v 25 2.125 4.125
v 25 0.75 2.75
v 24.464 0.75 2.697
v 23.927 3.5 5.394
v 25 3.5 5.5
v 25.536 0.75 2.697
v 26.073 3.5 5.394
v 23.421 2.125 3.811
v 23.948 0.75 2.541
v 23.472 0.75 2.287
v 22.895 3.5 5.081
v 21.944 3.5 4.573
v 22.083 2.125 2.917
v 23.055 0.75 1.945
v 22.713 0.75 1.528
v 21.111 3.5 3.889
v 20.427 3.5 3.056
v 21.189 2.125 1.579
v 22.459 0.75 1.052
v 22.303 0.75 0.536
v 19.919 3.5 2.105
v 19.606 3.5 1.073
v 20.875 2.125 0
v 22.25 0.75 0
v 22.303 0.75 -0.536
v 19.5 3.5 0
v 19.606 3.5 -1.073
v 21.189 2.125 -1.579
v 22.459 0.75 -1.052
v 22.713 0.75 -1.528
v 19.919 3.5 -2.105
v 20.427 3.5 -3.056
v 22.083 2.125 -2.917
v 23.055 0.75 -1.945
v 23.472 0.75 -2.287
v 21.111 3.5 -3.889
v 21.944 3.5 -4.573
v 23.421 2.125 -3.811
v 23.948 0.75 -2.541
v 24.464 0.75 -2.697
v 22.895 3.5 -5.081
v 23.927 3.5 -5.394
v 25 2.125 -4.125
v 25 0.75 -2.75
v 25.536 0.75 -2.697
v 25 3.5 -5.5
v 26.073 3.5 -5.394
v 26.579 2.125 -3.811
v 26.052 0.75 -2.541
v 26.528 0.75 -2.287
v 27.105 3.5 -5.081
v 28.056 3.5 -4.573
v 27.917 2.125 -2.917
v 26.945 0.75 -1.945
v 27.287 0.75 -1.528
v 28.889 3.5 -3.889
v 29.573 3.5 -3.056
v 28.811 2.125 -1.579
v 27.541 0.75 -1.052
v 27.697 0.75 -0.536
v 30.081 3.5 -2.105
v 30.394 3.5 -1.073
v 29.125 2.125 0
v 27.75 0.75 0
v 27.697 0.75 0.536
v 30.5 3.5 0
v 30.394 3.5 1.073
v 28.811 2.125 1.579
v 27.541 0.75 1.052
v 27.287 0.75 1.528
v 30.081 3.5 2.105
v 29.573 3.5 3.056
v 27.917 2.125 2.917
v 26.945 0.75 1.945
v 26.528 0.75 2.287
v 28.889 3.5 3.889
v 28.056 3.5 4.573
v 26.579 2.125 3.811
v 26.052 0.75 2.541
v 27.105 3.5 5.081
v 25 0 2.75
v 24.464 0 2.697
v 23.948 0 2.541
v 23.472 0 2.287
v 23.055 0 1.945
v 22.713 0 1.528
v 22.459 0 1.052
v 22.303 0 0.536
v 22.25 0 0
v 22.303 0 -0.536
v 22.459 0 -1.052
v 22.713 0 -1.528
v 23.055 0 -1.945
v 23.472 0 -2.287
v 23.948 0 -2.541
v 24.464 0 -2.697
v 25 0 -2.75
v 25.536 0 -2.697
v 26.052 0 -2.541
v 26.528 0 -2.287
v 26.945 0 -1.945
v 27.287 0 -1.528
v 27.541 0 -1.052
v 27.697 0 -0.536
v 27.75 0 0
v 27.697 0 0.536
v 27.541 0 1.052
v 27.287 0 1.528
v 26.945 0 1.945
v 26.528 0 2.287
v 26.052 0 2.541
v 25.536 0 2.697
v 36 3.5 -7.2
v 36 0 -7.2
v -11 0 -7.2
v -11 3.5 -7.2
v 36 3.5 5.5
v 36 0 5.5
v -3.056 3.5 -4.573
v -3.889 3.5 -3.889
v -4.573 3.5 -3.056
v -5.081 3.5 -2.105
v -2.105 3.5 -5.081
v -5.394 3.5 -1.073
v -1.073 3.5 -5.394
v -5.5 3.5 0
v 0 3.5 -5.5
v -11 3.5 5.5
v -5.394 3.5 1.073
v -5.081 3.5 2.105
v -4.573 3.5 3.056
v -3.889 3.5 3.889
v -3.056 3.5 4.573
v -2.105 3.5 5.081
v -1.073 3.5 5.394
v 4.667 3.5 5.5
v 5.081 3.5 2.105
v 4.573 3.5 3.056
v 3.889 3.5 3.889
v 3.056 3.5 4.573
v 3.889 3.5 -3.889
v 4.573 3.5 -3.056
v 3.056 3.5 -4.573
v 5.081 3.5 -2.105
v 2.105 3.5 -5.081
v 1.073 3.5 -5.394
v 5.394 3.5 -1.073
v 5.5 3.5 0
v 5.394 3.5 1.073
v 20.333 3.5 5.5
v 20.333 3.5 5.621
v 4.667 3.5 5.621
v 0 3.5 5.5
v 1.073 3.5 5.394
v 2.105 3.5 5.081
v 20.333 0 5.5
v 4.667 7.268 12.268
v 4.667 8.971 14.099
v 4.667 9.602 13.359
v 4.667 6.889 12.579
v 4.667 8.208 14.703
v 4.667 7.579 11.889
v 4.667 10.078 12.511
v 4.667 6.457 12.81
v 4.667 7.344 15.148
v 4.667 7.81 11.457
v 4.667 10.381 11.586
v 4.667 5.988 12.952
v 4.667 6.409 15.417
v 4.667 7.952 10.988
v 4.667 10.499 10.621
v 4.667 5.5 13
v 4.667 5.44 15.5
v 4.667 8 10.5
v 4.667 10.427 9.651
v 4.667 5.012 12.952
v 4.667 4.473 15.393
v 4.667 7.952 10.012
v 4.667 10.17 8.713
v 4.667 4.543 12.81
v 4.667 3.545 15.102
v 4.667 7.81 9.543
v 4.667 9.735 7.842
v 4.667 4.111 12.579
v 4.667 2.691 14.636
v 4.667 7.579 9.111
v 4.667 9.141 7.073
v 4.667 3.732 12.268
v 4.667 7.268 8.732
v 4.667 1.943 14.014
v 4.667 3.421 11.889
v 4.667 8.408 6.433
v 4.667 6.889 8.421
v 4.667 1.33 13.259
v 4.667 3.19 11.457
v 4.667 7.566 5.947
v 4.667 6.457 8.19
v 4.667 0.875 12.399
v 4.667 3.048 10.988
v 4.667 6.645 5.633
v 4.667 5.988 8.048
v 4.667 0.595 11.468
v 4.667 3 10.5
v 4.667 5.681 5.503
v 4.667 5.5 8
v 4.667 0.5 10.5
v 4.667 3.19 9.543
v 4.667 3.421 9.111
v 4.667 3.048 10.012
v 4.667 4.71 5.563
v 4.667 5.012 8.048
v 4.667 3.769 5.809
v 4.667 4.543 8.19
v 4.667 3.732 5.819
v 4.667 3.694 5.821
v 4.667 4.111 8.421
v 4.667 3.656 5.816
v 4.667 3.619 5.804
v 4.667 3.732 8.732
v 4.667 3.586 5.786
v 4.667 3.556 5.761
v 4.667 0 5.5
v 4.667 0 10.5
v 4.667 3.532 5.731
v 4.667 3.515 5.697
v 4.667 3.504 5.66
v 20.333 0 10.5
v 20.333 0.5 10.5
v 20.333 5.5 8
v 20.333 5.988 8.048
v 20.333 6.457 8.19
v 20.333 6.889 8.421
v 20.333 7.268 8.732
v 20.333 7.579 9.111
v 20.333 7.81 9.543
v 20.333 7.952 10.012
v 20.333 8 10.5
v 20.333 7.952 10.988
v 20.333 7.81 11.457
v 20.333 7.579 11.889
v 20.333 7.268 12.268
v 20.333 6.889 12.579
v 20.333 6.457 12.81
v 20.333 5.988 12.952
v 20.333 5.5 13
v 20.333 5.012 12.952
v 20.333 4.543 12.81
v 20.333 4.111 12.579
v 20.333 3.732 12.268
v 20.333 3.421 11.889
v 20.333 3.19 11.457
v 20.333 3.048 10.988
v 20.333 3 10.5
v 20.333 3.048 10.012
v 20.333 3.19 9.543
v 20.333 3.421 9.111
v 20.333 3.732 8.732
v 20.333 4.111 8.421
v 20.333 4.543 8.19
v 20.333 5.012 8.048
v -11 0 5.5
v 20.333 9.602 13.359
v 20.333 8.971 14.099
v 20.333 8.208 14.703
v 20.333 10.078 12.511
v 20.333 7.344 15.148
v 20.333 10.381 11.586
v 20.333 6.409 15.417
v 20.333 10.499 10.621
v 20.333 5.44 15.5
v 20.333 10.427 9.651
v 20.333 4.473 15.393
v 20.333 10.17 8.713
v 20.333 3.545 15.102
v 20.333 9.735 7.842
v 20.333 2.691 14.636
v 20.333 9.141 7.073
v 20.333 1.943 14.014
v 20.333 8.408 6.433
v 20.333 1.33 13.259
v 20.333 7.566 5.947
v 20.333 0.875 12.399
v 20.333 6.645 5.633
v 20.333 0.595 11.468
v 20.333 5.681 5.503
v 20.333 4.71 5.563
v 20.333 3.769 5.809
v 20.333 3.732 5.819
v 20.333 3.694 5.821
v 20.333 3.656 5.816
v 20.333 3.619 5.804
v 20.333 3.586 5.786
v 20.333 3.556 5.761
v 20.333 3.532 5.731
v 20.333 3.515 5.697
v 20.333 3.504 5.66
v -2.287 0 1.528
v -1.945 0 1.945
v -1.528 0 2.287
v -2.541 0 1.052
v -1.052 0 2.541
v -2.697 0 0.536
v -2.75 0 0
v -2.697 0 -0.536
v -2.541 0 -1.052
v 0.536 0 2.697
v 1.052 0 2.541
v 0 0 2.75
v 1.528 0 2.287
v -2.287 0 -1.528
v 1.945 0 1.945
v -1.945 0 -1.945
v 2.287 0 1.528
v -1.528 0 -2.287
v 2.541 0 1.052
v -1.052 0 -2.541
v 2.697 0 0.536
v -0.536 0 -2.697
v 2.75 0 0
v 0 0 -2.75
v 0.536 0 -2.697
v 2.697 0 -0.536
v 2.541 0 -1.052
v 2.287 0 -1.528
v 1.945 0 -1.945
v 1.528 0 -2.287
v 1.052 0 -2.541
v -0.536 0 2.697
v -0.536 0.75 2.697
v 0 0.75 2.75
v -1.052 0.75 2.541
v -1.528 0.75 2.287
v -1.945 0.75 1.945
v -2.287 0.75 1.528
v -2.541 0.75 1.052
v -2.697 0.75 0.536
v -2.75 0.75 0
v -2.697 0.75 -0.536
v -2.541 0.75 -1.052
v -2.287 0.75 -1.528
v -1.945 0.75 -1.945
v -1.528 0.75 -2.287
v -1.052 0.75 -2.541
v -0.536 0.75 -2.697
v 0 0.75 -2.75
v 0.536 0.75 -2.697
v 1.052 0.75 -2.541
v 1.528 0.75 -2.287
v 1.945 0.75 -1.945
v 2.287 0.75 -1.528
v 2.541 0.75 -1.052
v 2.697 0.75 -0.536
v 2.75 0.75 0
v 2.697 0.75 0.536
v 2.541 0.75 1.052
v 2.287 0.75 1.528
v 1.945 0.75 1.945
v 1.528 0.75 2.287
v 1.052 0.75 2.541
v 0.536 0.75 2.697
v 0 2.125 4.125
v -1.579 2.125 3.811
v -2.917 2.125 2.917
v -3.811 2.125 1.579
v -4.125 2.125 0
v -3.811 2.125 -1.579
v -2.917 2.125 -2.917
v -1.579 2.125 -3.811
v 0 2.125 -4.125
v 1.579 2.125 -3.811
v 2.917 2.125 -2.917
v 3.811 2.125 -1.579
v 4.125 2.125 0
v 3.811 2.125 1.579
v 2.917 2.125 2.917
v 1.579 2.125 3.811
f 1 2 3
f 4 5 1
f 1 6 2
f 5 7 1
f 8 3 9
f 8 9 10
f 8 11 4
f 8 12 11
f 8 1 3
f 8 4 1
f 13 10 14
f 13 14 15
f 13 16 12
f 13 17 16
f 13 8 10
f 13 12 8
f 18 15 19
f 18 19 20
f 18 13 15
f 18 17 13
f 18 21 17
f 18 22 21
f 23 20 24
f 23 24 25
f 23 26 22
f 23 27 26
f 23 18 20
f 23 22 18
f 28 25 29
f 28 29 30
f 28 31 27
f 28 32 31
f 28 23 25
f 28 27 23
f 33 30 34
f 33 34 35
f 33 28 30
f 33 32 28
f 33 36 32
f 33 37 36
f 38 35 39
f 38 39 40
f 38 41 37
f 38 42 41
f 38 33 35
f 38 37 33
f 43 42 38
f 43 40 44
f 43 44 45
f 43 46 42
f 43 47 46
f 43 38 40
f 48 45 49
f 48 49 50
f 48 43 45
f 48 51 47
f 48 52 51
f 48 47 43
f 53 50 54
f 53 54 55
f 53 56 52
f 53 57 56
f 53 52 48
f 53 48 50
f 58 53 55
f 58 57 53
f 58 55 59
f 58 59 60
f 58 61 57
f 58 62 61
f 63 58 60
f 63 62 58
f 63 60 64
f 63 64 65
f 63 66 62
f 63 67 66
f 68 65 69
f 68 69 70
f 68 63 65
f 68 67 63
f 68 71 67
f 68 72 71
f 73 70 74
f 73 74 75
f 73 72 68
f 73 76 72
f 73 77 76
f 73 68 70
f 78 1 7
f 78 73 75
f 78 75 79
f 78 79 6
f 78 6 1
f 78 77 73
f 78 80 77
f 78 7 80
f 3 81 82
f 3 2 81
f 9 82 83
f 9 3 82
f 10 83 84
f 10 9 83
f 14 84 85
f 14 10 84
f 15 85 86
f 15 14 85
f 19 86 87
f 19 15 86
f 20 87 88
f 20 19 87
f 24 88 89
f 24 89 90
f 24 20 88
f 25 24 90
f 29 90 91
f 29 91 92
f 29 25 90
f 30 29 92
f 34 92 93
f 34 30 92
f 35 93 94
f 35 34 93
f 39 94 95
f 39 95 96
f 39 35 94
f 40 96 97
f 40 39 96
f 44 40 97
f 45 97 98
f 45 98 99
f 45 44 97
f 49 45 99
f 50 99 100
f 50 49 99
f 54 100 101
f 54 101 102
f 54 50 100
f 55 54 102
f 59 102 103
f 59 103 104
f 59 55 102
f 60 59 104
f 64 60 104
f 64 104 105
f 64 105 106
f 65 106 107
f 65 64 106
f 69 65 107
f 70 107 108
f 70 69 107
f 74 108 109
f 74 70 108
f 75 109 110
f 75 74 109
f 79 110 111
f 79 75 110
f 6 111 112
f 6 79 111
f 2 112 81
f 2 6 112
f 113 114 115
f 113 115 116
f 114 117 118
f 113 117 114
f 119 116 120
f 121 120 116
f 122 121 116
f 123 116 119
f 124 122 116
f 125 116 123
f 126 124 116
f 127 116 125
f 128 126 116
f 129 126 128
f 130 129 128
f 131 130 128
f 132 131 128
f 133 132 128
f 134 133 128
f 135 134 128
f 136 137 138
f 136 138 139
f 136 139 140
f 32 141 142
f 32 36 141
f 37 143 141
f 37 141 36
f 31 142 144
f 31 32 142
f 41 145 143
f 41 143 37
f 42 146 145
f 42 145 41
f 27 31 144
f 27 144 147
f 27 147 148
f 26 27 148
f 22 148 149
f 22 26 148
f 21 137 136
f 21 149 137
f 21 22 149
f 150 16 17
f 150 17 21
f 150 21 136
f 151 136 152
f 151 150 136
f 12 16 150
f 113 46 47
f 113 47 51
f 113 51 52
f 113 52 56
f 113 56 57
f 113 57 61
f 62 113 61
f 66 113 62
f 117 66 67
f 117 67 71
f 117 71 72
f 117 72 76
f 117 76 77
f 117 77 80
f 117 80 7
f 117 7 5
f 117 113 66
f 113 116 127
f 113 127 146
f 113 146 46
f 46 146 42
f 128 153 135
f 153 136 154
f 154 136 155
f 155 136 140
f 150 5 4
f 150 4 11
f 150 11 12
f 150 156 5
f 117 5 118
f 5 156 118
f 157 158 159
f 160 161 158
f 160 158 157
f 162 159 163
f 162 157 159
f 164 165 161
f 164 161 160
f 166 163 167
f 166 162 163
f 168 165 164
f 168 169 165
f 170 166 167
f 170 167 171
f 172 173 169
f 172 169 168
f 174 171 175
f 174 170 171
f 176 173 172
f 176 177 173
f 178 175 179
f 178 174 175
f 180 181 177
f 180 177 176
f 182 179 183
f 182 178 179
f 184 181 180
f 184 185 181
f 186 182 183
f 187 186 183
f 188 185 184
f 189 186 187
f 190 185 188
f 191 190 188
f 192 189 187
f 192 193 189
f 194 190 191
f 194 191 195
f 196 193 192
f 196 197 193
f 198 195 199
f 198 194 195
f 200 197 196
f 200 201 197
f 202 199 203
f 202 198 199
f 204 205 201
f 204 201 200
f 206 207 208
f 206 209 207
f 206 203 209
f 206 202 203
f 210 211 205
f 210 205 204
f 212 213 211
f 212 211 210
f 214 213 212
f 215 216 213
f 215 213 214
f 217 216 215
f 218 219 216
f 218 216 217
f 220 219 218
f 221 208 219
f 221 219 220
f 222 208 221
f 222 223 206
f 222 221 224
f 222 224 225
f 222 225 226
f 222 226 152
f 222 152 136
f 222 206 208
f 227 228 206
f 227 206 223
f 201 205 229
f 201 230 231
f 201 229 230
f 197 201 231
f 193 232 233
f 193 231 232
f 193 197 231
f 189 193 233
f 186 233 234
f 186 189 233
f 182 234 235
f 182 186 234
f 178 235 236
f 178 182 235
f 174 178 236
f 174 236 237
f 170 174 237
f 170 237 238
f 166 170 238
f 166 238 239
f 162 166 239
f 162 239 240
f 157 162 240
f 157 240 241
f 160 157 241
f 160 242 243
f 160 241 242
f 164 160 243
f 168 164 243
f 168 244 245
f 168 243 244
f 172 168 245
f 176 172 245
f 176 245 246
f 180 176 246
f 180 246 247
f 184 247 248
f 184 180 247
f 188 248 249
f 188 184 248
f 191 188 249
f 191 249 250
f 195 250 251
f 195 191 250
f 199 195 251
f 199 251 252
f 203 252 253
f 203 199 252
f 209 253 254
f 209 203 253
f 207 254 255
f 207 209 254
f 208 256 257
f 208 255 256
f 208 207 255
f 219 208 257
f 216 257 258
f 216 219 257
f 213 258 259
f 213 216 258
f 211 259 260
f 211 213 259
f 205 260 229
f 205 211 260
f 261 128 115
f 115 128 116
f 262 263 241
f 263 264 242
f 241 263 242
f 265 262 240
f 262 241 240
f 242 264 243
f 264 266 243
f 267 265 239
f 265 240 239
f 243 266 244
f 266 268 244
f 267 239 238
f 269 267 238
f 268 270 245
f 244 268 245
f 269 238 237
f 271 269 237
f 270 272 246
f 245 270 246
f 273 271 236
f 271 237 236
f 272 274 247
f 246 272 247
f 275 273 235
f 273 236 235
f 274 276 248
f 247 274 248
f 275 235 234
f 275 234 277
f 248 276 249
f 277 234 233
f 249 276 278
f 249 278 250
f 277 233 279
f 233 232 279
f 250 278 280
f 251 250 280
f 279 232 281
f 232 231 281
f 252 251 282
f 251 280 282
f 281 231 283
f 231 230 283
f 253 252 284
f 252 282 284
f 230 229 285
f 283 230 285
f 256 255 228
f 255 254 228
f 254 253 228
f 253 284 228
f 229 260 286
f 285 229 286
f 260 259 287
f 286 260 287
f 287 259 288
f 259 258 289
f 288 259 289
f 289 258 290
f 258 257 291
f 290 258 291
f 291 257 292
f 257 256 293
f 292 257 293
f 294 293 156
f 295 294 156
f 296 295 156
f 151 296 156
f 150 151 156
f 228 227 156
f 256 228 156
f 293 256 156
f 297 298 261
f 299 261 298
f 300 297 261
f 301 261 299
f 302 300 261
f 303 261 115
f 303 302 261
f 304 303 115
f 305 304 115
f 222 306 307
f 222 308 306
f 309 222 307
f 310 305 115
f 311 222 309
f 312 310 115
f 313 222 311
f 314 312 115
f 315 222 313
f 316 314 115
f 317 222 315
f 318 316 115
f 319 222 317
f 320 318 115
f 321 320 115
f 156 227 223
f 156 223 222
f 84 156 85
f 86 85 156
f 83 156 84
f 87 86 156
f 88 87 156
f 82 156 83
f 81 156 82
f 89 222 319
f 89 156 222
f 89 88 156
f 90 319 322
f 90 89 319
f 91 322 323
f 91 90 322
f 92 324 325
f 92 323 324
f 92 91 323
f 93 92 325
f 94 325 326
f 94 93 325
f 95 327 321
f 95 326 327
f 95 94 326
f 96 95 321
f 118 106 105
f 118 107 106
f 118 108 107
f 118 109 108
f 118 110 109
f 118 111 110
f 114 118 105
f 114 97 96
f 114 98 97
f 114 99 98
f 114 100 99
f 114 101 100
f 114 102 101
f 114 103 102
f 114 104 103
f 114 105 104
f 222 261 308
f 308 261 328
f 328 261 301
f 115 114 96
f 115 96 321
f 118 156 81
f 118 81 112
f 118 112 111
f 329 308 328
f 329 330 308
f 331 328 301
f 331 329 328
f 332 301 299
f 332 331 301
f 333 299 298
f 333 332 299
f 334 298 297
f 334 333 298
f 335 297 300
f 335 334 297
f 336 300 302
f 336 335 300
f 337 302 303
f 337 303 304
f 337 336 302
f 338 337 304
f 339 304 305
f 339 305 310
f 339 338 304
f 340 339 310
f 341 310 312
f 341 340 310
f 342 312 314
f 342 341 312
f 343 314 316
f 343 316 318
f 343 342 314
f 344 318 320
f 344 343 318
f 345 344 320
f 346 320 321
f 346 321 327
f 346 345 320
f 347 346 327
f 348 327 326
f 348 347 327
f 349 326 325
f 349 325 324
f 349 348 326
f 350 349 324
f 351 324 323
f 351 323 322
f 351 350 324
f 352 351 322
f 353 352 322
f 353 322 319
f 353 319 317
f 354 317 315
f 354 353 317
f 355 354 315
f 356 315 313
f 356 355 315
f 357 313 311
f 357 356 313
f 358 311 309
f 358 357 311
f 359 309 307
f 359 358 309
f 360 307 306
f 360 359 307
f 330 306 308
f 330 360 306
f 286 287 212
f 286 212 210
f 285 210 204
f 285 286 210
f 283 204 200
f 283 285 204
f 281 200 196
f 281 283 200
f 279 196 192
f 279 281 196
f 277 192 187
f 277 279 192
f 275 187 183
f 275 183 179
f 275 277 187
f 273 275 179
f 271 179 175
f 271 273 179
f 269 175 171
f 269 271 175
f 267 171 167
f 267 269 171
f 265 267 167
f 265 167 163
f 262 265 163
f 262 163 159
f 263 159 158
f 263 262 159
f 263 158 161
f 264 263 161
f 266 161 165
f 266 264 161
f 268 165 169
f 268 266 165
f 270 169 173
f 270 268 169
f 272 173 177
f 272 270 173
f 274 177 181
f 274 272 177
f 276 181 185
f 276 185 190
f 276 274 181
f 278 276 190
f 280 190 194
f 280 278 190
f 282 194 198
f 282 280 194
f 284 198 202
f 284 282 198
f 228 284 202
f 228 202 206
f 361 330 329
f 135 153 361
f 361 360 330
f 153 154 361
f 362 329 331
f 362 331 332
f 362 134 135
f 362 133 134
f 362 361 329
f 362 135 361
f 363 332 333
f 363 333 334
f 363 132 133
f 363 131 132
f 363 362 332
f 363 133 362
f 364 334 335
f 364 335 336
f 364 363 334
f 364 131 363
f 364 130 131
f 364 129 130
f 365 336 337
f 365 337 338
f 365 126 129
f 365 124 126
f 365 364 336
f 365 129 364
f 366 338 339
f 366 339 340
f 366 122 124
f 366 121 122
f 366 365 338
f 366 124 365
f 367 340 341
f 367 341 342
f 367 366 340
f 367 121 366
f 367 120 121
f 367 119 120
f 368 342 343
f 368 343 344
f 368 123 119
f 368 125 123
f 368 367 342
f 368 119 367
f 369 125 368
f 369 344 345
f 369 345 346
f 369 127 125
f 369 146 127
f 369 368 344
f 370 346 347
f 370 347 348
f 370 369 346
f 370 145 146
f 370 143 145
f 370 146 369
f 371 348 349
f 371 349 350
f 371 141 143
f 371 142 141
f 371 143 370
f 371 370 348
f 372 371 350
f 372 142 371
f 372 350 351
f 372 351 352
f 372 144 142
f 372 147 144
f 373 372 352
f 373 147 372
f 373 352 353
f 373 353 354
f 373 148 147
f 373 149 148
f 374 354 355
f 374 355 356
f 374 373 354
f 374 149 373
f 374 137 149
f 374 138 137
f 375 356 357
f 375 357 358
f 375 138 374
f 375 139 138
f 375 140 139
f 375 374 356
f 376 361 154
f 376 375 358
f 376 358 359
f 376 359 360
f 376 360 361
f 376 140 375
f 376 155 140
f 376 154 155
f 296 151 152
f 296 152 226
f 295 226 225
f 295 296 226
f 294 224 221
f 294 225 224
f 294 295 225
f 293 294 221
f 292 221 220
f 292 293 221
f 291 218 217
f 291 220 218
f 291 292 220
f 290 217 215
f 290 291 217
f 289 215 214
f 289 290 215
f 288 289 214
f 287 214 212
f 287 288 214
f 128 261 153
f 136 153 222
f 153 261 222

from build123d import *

# Parameters (mm, degrees)
SKETCH1_R                = 2.5
BOSS_EXTRUDE1_DEPTH      = 36
BOSS_EXTRUDE1_DEPTH_BACK = 11
CSK1_AT_2_COUNT          = 2
CSK1_AT_2_PITCH          = 25
SKETCH4_W                = 15.666666667
SKETCH4_H                = 10
CUT_EXTRUDE1_DEPTH       = 11.5


with BuildPart() as part:
    # Sketch1 → Boss-Extrude1 (new body, two sides)
    with BuildSketch(Plane(origin=(0, 0, 0), x_dir=(0, 0, -1), z_dir=(1, 0, 0))) as boss_extrude1_sk:
        with BuildLine():
            Line((-10.5, 0.5), (-10.5, 0))
            Line((-10.5, 0), (7.2, 0))
            Line((7.2, 0), (7.2, 3.5))
            Line((7.2, 3.5), (-5.621475633, 3.5))
            ThreePointArc((-5.621475633, 3.5), (-5.785558164, 3.585645625), (-5.809111186, 3.769230769))
            ThreePointArc((-5.809111186, 3.769230769), (-13.358859374, 9.602063271), (-10.5, 0.5))
        make_face()
        with Locations((-10.5, 5.5)):
            Circle(SKETCH1_R, mode=Mode.SUBTRACT)
    extrude(amount=BOSS_EXTRUDE1_DEPTH)
    extrude(boss_extrude1_sk.sketch, amount=-BOSS_EXTRUDE1_DEPTH_BACK)

    # Sketch2 → CSK1 (revolve, cut)
    with BuildSketch(Plane(origin=(0, 3.5, 0), x_dir=(0, 0, 1), z_dir=(1, 0, 0))):
        Polygon((0, 0), (0, 3.5), (2.75, 3.5), (2.75, 2.75), (5.5, 0), align=None)
    csk1 = revolve(axis=Axis((0, 9.85, 0), (0, -1, 0)), mode=Mode.SUBTRACT)

    # CSK1 at 2: CSK1 ×2
    with Locations(*[(i * CSK1_AT_2_PITCH, 0, 0) for i in range(1, CSK1_AT_2_COUNT)]):
        add(csk1, mode=Mode.SUBTRACT)

    # Sketch4 → Cut-Extrude1 (cut, through all)
    with BuildSketch(Plane(origin=(0, 0, 0), x_dir=(1, 0, 0), z_dir=(0, 1, 0))):
        with Locations((-3.166666666, -10.5)):
            Rectangle(SKETCH4_W, SKETCH4_H)
        with Locations((28.166666666, -10.5)):
            Rectangle(SKETCH4_W, SKETCH4_H)
    extrude(amount=CUT_EXTRUDE1_DEPTH, mode=Mode.SUBTRACT)


solid = part.part
